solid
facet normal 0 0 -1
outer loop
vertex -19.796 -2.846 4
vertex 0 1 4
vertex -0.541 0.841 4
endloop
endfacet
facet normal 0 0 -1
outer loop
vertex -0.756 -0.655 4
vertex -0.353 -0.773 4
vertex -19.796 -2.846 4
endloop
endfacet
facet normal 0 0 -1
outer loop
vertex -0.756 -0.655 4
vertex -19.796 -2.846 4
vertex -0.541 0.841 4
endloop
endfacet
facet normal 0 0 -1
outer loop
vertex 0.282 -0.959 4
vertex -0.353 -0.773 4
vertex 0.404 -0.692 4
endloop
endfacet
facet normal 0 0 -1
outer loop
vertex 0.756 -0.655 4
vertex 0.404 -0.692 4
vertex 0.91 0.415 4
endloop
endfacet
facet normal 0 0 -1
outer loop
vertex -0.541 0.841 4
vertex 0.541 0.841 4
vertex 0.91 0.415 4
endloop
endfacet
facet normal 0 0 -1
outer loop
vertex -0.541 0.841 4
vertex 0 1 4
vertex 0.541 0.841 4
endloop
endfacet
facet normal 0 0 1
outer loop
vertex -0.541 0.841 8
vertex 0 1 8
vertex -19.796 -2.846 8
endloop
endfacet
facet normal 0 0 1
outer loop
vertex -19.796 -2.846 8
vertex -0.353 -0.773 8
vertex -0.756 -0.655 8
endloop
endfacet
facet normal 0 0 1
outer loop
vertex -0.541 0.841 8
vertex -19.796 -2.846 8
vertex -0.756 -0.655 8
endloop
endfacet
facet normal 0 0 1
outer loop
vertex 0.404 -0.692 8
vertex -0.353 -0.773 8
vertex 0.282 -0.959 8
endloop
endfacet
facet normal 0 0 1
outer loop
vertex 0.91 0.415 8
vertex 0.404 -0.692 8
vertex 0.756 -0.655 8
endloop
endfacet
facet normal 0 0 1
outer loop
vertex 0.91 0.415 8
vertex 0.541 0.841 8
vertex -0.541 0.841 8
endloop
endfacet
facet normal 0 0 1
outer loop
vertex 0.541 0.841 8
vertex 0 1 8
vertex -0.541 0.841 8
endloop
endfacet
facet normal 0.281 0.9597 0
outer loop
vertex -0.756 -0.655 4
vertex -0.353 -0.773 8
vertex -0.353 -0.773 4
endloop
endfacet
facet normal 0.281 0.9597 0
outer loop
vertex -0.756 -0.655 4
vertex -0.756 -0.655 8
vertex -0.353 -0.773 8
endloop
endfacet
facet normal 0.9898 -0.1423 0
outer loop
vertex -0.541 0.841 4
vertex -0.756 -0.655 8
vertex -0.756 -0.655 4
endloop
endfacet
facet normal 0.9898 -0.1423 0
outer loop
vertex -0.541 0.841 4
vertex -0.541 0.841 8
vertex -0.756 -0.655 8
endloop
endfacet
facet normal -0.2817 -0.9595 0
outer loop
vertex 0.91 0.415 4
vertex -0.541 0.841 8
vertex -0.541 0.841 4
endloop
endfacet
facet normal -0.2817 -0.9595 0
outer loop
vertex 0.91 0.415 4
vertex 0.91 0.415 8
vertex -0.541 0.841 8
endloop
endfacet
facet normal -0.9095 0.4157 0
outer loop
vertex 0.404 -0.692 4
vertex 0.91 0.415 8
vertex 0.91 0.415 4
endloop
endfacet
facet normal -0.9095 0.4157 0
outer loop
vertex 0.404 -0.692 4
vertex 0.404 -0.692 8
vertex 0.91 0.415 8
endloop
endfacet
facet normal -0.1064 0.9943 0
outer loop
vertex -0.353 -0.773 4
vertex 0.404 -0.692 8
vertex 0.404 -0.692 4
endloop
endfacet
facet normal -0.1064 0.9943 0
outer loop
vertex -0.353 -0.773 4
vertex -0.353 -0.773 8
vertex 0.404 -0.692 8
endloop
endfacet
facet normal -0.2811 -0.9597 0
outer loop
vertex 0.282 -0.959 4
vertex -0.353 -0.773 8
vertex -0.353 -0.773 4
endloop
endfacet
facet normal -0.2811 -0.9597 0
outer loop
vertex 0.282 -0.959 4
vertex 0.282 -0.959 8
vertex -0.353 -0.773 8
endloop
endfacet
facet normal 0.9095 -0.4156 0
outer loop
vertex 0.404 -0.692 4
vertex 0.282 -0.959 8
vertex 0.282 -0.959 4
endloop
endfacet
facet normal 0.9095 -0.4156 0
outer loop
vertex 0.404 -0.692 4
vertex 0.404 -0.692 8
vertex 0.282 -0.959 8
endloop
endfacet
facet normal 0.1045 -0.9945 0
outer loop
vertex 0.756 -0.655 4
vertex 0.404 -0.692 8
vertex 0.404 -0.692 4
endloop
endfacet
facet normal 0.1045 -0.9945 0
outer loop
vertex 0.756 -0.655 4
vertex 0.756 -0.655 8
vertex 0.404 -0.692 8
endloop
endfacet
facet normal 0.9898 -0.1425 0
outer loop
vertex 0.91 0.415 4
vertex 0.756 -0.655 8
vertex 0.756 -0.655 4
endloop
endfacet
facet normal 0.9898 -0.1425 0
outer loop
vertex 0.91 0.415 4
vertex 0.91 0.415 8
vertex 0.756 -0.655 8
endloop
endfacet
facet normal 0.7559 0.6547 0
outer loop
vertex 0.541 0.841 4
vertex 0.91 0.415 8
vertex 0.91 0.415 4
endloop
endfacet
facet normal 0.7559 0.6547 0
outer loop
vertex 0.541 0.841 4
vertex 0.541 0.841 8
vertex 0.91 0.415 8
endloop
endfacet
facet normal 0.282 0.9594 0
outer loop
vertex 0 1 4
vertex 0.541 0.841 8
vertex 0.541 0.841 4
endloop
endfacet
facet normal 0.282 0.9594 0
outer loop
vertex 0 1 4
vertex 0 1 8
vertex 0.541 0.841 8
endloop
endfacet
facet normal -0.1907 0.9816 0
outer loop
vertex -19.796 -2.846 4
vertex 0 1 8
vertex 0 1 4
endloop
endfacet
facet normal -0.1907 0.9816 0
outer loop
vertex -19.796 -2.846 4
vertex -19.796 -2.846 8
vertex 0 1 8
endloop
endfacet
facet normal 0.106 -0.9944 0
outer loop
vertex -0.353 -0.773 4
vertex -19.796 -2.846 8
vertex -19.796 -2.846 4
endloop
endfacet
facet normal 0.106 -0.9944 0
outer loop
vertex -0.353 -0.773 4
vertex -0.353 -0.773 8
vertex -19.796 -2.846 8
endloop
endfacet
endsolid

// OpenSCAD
union() {
	translate(v = [0, 0, 0]) {
		linear_extrude(height = 4) {
			polygon(paths = [[0]], points = [[0.0, 1.0]]);
		}
	}
	translate(v = [0, 0, 4]) {
		linear_extrude(height = 4) {
			polygon(paths = [[0, 1, 2, 3, 4, 5, 6, 7, 8, 9, 10]], points = [[0.0, 1.0], [0.540640817456, 0.841253532831], [0.755749574354, -0.654860733945], [0.540640817456, 0.841253532831], [0.909631995355, 0.415415013002], [0.281732556841, -0.959492973614], [-0.755749574354, -0.654860733945], [-0.540640817456, 0.841253532831], [0.909631995355, 0.415415013002], [0.755749574354, -0.654860733945], [-19.7964288376, -2.84629676547]]);
		}
	}
}
